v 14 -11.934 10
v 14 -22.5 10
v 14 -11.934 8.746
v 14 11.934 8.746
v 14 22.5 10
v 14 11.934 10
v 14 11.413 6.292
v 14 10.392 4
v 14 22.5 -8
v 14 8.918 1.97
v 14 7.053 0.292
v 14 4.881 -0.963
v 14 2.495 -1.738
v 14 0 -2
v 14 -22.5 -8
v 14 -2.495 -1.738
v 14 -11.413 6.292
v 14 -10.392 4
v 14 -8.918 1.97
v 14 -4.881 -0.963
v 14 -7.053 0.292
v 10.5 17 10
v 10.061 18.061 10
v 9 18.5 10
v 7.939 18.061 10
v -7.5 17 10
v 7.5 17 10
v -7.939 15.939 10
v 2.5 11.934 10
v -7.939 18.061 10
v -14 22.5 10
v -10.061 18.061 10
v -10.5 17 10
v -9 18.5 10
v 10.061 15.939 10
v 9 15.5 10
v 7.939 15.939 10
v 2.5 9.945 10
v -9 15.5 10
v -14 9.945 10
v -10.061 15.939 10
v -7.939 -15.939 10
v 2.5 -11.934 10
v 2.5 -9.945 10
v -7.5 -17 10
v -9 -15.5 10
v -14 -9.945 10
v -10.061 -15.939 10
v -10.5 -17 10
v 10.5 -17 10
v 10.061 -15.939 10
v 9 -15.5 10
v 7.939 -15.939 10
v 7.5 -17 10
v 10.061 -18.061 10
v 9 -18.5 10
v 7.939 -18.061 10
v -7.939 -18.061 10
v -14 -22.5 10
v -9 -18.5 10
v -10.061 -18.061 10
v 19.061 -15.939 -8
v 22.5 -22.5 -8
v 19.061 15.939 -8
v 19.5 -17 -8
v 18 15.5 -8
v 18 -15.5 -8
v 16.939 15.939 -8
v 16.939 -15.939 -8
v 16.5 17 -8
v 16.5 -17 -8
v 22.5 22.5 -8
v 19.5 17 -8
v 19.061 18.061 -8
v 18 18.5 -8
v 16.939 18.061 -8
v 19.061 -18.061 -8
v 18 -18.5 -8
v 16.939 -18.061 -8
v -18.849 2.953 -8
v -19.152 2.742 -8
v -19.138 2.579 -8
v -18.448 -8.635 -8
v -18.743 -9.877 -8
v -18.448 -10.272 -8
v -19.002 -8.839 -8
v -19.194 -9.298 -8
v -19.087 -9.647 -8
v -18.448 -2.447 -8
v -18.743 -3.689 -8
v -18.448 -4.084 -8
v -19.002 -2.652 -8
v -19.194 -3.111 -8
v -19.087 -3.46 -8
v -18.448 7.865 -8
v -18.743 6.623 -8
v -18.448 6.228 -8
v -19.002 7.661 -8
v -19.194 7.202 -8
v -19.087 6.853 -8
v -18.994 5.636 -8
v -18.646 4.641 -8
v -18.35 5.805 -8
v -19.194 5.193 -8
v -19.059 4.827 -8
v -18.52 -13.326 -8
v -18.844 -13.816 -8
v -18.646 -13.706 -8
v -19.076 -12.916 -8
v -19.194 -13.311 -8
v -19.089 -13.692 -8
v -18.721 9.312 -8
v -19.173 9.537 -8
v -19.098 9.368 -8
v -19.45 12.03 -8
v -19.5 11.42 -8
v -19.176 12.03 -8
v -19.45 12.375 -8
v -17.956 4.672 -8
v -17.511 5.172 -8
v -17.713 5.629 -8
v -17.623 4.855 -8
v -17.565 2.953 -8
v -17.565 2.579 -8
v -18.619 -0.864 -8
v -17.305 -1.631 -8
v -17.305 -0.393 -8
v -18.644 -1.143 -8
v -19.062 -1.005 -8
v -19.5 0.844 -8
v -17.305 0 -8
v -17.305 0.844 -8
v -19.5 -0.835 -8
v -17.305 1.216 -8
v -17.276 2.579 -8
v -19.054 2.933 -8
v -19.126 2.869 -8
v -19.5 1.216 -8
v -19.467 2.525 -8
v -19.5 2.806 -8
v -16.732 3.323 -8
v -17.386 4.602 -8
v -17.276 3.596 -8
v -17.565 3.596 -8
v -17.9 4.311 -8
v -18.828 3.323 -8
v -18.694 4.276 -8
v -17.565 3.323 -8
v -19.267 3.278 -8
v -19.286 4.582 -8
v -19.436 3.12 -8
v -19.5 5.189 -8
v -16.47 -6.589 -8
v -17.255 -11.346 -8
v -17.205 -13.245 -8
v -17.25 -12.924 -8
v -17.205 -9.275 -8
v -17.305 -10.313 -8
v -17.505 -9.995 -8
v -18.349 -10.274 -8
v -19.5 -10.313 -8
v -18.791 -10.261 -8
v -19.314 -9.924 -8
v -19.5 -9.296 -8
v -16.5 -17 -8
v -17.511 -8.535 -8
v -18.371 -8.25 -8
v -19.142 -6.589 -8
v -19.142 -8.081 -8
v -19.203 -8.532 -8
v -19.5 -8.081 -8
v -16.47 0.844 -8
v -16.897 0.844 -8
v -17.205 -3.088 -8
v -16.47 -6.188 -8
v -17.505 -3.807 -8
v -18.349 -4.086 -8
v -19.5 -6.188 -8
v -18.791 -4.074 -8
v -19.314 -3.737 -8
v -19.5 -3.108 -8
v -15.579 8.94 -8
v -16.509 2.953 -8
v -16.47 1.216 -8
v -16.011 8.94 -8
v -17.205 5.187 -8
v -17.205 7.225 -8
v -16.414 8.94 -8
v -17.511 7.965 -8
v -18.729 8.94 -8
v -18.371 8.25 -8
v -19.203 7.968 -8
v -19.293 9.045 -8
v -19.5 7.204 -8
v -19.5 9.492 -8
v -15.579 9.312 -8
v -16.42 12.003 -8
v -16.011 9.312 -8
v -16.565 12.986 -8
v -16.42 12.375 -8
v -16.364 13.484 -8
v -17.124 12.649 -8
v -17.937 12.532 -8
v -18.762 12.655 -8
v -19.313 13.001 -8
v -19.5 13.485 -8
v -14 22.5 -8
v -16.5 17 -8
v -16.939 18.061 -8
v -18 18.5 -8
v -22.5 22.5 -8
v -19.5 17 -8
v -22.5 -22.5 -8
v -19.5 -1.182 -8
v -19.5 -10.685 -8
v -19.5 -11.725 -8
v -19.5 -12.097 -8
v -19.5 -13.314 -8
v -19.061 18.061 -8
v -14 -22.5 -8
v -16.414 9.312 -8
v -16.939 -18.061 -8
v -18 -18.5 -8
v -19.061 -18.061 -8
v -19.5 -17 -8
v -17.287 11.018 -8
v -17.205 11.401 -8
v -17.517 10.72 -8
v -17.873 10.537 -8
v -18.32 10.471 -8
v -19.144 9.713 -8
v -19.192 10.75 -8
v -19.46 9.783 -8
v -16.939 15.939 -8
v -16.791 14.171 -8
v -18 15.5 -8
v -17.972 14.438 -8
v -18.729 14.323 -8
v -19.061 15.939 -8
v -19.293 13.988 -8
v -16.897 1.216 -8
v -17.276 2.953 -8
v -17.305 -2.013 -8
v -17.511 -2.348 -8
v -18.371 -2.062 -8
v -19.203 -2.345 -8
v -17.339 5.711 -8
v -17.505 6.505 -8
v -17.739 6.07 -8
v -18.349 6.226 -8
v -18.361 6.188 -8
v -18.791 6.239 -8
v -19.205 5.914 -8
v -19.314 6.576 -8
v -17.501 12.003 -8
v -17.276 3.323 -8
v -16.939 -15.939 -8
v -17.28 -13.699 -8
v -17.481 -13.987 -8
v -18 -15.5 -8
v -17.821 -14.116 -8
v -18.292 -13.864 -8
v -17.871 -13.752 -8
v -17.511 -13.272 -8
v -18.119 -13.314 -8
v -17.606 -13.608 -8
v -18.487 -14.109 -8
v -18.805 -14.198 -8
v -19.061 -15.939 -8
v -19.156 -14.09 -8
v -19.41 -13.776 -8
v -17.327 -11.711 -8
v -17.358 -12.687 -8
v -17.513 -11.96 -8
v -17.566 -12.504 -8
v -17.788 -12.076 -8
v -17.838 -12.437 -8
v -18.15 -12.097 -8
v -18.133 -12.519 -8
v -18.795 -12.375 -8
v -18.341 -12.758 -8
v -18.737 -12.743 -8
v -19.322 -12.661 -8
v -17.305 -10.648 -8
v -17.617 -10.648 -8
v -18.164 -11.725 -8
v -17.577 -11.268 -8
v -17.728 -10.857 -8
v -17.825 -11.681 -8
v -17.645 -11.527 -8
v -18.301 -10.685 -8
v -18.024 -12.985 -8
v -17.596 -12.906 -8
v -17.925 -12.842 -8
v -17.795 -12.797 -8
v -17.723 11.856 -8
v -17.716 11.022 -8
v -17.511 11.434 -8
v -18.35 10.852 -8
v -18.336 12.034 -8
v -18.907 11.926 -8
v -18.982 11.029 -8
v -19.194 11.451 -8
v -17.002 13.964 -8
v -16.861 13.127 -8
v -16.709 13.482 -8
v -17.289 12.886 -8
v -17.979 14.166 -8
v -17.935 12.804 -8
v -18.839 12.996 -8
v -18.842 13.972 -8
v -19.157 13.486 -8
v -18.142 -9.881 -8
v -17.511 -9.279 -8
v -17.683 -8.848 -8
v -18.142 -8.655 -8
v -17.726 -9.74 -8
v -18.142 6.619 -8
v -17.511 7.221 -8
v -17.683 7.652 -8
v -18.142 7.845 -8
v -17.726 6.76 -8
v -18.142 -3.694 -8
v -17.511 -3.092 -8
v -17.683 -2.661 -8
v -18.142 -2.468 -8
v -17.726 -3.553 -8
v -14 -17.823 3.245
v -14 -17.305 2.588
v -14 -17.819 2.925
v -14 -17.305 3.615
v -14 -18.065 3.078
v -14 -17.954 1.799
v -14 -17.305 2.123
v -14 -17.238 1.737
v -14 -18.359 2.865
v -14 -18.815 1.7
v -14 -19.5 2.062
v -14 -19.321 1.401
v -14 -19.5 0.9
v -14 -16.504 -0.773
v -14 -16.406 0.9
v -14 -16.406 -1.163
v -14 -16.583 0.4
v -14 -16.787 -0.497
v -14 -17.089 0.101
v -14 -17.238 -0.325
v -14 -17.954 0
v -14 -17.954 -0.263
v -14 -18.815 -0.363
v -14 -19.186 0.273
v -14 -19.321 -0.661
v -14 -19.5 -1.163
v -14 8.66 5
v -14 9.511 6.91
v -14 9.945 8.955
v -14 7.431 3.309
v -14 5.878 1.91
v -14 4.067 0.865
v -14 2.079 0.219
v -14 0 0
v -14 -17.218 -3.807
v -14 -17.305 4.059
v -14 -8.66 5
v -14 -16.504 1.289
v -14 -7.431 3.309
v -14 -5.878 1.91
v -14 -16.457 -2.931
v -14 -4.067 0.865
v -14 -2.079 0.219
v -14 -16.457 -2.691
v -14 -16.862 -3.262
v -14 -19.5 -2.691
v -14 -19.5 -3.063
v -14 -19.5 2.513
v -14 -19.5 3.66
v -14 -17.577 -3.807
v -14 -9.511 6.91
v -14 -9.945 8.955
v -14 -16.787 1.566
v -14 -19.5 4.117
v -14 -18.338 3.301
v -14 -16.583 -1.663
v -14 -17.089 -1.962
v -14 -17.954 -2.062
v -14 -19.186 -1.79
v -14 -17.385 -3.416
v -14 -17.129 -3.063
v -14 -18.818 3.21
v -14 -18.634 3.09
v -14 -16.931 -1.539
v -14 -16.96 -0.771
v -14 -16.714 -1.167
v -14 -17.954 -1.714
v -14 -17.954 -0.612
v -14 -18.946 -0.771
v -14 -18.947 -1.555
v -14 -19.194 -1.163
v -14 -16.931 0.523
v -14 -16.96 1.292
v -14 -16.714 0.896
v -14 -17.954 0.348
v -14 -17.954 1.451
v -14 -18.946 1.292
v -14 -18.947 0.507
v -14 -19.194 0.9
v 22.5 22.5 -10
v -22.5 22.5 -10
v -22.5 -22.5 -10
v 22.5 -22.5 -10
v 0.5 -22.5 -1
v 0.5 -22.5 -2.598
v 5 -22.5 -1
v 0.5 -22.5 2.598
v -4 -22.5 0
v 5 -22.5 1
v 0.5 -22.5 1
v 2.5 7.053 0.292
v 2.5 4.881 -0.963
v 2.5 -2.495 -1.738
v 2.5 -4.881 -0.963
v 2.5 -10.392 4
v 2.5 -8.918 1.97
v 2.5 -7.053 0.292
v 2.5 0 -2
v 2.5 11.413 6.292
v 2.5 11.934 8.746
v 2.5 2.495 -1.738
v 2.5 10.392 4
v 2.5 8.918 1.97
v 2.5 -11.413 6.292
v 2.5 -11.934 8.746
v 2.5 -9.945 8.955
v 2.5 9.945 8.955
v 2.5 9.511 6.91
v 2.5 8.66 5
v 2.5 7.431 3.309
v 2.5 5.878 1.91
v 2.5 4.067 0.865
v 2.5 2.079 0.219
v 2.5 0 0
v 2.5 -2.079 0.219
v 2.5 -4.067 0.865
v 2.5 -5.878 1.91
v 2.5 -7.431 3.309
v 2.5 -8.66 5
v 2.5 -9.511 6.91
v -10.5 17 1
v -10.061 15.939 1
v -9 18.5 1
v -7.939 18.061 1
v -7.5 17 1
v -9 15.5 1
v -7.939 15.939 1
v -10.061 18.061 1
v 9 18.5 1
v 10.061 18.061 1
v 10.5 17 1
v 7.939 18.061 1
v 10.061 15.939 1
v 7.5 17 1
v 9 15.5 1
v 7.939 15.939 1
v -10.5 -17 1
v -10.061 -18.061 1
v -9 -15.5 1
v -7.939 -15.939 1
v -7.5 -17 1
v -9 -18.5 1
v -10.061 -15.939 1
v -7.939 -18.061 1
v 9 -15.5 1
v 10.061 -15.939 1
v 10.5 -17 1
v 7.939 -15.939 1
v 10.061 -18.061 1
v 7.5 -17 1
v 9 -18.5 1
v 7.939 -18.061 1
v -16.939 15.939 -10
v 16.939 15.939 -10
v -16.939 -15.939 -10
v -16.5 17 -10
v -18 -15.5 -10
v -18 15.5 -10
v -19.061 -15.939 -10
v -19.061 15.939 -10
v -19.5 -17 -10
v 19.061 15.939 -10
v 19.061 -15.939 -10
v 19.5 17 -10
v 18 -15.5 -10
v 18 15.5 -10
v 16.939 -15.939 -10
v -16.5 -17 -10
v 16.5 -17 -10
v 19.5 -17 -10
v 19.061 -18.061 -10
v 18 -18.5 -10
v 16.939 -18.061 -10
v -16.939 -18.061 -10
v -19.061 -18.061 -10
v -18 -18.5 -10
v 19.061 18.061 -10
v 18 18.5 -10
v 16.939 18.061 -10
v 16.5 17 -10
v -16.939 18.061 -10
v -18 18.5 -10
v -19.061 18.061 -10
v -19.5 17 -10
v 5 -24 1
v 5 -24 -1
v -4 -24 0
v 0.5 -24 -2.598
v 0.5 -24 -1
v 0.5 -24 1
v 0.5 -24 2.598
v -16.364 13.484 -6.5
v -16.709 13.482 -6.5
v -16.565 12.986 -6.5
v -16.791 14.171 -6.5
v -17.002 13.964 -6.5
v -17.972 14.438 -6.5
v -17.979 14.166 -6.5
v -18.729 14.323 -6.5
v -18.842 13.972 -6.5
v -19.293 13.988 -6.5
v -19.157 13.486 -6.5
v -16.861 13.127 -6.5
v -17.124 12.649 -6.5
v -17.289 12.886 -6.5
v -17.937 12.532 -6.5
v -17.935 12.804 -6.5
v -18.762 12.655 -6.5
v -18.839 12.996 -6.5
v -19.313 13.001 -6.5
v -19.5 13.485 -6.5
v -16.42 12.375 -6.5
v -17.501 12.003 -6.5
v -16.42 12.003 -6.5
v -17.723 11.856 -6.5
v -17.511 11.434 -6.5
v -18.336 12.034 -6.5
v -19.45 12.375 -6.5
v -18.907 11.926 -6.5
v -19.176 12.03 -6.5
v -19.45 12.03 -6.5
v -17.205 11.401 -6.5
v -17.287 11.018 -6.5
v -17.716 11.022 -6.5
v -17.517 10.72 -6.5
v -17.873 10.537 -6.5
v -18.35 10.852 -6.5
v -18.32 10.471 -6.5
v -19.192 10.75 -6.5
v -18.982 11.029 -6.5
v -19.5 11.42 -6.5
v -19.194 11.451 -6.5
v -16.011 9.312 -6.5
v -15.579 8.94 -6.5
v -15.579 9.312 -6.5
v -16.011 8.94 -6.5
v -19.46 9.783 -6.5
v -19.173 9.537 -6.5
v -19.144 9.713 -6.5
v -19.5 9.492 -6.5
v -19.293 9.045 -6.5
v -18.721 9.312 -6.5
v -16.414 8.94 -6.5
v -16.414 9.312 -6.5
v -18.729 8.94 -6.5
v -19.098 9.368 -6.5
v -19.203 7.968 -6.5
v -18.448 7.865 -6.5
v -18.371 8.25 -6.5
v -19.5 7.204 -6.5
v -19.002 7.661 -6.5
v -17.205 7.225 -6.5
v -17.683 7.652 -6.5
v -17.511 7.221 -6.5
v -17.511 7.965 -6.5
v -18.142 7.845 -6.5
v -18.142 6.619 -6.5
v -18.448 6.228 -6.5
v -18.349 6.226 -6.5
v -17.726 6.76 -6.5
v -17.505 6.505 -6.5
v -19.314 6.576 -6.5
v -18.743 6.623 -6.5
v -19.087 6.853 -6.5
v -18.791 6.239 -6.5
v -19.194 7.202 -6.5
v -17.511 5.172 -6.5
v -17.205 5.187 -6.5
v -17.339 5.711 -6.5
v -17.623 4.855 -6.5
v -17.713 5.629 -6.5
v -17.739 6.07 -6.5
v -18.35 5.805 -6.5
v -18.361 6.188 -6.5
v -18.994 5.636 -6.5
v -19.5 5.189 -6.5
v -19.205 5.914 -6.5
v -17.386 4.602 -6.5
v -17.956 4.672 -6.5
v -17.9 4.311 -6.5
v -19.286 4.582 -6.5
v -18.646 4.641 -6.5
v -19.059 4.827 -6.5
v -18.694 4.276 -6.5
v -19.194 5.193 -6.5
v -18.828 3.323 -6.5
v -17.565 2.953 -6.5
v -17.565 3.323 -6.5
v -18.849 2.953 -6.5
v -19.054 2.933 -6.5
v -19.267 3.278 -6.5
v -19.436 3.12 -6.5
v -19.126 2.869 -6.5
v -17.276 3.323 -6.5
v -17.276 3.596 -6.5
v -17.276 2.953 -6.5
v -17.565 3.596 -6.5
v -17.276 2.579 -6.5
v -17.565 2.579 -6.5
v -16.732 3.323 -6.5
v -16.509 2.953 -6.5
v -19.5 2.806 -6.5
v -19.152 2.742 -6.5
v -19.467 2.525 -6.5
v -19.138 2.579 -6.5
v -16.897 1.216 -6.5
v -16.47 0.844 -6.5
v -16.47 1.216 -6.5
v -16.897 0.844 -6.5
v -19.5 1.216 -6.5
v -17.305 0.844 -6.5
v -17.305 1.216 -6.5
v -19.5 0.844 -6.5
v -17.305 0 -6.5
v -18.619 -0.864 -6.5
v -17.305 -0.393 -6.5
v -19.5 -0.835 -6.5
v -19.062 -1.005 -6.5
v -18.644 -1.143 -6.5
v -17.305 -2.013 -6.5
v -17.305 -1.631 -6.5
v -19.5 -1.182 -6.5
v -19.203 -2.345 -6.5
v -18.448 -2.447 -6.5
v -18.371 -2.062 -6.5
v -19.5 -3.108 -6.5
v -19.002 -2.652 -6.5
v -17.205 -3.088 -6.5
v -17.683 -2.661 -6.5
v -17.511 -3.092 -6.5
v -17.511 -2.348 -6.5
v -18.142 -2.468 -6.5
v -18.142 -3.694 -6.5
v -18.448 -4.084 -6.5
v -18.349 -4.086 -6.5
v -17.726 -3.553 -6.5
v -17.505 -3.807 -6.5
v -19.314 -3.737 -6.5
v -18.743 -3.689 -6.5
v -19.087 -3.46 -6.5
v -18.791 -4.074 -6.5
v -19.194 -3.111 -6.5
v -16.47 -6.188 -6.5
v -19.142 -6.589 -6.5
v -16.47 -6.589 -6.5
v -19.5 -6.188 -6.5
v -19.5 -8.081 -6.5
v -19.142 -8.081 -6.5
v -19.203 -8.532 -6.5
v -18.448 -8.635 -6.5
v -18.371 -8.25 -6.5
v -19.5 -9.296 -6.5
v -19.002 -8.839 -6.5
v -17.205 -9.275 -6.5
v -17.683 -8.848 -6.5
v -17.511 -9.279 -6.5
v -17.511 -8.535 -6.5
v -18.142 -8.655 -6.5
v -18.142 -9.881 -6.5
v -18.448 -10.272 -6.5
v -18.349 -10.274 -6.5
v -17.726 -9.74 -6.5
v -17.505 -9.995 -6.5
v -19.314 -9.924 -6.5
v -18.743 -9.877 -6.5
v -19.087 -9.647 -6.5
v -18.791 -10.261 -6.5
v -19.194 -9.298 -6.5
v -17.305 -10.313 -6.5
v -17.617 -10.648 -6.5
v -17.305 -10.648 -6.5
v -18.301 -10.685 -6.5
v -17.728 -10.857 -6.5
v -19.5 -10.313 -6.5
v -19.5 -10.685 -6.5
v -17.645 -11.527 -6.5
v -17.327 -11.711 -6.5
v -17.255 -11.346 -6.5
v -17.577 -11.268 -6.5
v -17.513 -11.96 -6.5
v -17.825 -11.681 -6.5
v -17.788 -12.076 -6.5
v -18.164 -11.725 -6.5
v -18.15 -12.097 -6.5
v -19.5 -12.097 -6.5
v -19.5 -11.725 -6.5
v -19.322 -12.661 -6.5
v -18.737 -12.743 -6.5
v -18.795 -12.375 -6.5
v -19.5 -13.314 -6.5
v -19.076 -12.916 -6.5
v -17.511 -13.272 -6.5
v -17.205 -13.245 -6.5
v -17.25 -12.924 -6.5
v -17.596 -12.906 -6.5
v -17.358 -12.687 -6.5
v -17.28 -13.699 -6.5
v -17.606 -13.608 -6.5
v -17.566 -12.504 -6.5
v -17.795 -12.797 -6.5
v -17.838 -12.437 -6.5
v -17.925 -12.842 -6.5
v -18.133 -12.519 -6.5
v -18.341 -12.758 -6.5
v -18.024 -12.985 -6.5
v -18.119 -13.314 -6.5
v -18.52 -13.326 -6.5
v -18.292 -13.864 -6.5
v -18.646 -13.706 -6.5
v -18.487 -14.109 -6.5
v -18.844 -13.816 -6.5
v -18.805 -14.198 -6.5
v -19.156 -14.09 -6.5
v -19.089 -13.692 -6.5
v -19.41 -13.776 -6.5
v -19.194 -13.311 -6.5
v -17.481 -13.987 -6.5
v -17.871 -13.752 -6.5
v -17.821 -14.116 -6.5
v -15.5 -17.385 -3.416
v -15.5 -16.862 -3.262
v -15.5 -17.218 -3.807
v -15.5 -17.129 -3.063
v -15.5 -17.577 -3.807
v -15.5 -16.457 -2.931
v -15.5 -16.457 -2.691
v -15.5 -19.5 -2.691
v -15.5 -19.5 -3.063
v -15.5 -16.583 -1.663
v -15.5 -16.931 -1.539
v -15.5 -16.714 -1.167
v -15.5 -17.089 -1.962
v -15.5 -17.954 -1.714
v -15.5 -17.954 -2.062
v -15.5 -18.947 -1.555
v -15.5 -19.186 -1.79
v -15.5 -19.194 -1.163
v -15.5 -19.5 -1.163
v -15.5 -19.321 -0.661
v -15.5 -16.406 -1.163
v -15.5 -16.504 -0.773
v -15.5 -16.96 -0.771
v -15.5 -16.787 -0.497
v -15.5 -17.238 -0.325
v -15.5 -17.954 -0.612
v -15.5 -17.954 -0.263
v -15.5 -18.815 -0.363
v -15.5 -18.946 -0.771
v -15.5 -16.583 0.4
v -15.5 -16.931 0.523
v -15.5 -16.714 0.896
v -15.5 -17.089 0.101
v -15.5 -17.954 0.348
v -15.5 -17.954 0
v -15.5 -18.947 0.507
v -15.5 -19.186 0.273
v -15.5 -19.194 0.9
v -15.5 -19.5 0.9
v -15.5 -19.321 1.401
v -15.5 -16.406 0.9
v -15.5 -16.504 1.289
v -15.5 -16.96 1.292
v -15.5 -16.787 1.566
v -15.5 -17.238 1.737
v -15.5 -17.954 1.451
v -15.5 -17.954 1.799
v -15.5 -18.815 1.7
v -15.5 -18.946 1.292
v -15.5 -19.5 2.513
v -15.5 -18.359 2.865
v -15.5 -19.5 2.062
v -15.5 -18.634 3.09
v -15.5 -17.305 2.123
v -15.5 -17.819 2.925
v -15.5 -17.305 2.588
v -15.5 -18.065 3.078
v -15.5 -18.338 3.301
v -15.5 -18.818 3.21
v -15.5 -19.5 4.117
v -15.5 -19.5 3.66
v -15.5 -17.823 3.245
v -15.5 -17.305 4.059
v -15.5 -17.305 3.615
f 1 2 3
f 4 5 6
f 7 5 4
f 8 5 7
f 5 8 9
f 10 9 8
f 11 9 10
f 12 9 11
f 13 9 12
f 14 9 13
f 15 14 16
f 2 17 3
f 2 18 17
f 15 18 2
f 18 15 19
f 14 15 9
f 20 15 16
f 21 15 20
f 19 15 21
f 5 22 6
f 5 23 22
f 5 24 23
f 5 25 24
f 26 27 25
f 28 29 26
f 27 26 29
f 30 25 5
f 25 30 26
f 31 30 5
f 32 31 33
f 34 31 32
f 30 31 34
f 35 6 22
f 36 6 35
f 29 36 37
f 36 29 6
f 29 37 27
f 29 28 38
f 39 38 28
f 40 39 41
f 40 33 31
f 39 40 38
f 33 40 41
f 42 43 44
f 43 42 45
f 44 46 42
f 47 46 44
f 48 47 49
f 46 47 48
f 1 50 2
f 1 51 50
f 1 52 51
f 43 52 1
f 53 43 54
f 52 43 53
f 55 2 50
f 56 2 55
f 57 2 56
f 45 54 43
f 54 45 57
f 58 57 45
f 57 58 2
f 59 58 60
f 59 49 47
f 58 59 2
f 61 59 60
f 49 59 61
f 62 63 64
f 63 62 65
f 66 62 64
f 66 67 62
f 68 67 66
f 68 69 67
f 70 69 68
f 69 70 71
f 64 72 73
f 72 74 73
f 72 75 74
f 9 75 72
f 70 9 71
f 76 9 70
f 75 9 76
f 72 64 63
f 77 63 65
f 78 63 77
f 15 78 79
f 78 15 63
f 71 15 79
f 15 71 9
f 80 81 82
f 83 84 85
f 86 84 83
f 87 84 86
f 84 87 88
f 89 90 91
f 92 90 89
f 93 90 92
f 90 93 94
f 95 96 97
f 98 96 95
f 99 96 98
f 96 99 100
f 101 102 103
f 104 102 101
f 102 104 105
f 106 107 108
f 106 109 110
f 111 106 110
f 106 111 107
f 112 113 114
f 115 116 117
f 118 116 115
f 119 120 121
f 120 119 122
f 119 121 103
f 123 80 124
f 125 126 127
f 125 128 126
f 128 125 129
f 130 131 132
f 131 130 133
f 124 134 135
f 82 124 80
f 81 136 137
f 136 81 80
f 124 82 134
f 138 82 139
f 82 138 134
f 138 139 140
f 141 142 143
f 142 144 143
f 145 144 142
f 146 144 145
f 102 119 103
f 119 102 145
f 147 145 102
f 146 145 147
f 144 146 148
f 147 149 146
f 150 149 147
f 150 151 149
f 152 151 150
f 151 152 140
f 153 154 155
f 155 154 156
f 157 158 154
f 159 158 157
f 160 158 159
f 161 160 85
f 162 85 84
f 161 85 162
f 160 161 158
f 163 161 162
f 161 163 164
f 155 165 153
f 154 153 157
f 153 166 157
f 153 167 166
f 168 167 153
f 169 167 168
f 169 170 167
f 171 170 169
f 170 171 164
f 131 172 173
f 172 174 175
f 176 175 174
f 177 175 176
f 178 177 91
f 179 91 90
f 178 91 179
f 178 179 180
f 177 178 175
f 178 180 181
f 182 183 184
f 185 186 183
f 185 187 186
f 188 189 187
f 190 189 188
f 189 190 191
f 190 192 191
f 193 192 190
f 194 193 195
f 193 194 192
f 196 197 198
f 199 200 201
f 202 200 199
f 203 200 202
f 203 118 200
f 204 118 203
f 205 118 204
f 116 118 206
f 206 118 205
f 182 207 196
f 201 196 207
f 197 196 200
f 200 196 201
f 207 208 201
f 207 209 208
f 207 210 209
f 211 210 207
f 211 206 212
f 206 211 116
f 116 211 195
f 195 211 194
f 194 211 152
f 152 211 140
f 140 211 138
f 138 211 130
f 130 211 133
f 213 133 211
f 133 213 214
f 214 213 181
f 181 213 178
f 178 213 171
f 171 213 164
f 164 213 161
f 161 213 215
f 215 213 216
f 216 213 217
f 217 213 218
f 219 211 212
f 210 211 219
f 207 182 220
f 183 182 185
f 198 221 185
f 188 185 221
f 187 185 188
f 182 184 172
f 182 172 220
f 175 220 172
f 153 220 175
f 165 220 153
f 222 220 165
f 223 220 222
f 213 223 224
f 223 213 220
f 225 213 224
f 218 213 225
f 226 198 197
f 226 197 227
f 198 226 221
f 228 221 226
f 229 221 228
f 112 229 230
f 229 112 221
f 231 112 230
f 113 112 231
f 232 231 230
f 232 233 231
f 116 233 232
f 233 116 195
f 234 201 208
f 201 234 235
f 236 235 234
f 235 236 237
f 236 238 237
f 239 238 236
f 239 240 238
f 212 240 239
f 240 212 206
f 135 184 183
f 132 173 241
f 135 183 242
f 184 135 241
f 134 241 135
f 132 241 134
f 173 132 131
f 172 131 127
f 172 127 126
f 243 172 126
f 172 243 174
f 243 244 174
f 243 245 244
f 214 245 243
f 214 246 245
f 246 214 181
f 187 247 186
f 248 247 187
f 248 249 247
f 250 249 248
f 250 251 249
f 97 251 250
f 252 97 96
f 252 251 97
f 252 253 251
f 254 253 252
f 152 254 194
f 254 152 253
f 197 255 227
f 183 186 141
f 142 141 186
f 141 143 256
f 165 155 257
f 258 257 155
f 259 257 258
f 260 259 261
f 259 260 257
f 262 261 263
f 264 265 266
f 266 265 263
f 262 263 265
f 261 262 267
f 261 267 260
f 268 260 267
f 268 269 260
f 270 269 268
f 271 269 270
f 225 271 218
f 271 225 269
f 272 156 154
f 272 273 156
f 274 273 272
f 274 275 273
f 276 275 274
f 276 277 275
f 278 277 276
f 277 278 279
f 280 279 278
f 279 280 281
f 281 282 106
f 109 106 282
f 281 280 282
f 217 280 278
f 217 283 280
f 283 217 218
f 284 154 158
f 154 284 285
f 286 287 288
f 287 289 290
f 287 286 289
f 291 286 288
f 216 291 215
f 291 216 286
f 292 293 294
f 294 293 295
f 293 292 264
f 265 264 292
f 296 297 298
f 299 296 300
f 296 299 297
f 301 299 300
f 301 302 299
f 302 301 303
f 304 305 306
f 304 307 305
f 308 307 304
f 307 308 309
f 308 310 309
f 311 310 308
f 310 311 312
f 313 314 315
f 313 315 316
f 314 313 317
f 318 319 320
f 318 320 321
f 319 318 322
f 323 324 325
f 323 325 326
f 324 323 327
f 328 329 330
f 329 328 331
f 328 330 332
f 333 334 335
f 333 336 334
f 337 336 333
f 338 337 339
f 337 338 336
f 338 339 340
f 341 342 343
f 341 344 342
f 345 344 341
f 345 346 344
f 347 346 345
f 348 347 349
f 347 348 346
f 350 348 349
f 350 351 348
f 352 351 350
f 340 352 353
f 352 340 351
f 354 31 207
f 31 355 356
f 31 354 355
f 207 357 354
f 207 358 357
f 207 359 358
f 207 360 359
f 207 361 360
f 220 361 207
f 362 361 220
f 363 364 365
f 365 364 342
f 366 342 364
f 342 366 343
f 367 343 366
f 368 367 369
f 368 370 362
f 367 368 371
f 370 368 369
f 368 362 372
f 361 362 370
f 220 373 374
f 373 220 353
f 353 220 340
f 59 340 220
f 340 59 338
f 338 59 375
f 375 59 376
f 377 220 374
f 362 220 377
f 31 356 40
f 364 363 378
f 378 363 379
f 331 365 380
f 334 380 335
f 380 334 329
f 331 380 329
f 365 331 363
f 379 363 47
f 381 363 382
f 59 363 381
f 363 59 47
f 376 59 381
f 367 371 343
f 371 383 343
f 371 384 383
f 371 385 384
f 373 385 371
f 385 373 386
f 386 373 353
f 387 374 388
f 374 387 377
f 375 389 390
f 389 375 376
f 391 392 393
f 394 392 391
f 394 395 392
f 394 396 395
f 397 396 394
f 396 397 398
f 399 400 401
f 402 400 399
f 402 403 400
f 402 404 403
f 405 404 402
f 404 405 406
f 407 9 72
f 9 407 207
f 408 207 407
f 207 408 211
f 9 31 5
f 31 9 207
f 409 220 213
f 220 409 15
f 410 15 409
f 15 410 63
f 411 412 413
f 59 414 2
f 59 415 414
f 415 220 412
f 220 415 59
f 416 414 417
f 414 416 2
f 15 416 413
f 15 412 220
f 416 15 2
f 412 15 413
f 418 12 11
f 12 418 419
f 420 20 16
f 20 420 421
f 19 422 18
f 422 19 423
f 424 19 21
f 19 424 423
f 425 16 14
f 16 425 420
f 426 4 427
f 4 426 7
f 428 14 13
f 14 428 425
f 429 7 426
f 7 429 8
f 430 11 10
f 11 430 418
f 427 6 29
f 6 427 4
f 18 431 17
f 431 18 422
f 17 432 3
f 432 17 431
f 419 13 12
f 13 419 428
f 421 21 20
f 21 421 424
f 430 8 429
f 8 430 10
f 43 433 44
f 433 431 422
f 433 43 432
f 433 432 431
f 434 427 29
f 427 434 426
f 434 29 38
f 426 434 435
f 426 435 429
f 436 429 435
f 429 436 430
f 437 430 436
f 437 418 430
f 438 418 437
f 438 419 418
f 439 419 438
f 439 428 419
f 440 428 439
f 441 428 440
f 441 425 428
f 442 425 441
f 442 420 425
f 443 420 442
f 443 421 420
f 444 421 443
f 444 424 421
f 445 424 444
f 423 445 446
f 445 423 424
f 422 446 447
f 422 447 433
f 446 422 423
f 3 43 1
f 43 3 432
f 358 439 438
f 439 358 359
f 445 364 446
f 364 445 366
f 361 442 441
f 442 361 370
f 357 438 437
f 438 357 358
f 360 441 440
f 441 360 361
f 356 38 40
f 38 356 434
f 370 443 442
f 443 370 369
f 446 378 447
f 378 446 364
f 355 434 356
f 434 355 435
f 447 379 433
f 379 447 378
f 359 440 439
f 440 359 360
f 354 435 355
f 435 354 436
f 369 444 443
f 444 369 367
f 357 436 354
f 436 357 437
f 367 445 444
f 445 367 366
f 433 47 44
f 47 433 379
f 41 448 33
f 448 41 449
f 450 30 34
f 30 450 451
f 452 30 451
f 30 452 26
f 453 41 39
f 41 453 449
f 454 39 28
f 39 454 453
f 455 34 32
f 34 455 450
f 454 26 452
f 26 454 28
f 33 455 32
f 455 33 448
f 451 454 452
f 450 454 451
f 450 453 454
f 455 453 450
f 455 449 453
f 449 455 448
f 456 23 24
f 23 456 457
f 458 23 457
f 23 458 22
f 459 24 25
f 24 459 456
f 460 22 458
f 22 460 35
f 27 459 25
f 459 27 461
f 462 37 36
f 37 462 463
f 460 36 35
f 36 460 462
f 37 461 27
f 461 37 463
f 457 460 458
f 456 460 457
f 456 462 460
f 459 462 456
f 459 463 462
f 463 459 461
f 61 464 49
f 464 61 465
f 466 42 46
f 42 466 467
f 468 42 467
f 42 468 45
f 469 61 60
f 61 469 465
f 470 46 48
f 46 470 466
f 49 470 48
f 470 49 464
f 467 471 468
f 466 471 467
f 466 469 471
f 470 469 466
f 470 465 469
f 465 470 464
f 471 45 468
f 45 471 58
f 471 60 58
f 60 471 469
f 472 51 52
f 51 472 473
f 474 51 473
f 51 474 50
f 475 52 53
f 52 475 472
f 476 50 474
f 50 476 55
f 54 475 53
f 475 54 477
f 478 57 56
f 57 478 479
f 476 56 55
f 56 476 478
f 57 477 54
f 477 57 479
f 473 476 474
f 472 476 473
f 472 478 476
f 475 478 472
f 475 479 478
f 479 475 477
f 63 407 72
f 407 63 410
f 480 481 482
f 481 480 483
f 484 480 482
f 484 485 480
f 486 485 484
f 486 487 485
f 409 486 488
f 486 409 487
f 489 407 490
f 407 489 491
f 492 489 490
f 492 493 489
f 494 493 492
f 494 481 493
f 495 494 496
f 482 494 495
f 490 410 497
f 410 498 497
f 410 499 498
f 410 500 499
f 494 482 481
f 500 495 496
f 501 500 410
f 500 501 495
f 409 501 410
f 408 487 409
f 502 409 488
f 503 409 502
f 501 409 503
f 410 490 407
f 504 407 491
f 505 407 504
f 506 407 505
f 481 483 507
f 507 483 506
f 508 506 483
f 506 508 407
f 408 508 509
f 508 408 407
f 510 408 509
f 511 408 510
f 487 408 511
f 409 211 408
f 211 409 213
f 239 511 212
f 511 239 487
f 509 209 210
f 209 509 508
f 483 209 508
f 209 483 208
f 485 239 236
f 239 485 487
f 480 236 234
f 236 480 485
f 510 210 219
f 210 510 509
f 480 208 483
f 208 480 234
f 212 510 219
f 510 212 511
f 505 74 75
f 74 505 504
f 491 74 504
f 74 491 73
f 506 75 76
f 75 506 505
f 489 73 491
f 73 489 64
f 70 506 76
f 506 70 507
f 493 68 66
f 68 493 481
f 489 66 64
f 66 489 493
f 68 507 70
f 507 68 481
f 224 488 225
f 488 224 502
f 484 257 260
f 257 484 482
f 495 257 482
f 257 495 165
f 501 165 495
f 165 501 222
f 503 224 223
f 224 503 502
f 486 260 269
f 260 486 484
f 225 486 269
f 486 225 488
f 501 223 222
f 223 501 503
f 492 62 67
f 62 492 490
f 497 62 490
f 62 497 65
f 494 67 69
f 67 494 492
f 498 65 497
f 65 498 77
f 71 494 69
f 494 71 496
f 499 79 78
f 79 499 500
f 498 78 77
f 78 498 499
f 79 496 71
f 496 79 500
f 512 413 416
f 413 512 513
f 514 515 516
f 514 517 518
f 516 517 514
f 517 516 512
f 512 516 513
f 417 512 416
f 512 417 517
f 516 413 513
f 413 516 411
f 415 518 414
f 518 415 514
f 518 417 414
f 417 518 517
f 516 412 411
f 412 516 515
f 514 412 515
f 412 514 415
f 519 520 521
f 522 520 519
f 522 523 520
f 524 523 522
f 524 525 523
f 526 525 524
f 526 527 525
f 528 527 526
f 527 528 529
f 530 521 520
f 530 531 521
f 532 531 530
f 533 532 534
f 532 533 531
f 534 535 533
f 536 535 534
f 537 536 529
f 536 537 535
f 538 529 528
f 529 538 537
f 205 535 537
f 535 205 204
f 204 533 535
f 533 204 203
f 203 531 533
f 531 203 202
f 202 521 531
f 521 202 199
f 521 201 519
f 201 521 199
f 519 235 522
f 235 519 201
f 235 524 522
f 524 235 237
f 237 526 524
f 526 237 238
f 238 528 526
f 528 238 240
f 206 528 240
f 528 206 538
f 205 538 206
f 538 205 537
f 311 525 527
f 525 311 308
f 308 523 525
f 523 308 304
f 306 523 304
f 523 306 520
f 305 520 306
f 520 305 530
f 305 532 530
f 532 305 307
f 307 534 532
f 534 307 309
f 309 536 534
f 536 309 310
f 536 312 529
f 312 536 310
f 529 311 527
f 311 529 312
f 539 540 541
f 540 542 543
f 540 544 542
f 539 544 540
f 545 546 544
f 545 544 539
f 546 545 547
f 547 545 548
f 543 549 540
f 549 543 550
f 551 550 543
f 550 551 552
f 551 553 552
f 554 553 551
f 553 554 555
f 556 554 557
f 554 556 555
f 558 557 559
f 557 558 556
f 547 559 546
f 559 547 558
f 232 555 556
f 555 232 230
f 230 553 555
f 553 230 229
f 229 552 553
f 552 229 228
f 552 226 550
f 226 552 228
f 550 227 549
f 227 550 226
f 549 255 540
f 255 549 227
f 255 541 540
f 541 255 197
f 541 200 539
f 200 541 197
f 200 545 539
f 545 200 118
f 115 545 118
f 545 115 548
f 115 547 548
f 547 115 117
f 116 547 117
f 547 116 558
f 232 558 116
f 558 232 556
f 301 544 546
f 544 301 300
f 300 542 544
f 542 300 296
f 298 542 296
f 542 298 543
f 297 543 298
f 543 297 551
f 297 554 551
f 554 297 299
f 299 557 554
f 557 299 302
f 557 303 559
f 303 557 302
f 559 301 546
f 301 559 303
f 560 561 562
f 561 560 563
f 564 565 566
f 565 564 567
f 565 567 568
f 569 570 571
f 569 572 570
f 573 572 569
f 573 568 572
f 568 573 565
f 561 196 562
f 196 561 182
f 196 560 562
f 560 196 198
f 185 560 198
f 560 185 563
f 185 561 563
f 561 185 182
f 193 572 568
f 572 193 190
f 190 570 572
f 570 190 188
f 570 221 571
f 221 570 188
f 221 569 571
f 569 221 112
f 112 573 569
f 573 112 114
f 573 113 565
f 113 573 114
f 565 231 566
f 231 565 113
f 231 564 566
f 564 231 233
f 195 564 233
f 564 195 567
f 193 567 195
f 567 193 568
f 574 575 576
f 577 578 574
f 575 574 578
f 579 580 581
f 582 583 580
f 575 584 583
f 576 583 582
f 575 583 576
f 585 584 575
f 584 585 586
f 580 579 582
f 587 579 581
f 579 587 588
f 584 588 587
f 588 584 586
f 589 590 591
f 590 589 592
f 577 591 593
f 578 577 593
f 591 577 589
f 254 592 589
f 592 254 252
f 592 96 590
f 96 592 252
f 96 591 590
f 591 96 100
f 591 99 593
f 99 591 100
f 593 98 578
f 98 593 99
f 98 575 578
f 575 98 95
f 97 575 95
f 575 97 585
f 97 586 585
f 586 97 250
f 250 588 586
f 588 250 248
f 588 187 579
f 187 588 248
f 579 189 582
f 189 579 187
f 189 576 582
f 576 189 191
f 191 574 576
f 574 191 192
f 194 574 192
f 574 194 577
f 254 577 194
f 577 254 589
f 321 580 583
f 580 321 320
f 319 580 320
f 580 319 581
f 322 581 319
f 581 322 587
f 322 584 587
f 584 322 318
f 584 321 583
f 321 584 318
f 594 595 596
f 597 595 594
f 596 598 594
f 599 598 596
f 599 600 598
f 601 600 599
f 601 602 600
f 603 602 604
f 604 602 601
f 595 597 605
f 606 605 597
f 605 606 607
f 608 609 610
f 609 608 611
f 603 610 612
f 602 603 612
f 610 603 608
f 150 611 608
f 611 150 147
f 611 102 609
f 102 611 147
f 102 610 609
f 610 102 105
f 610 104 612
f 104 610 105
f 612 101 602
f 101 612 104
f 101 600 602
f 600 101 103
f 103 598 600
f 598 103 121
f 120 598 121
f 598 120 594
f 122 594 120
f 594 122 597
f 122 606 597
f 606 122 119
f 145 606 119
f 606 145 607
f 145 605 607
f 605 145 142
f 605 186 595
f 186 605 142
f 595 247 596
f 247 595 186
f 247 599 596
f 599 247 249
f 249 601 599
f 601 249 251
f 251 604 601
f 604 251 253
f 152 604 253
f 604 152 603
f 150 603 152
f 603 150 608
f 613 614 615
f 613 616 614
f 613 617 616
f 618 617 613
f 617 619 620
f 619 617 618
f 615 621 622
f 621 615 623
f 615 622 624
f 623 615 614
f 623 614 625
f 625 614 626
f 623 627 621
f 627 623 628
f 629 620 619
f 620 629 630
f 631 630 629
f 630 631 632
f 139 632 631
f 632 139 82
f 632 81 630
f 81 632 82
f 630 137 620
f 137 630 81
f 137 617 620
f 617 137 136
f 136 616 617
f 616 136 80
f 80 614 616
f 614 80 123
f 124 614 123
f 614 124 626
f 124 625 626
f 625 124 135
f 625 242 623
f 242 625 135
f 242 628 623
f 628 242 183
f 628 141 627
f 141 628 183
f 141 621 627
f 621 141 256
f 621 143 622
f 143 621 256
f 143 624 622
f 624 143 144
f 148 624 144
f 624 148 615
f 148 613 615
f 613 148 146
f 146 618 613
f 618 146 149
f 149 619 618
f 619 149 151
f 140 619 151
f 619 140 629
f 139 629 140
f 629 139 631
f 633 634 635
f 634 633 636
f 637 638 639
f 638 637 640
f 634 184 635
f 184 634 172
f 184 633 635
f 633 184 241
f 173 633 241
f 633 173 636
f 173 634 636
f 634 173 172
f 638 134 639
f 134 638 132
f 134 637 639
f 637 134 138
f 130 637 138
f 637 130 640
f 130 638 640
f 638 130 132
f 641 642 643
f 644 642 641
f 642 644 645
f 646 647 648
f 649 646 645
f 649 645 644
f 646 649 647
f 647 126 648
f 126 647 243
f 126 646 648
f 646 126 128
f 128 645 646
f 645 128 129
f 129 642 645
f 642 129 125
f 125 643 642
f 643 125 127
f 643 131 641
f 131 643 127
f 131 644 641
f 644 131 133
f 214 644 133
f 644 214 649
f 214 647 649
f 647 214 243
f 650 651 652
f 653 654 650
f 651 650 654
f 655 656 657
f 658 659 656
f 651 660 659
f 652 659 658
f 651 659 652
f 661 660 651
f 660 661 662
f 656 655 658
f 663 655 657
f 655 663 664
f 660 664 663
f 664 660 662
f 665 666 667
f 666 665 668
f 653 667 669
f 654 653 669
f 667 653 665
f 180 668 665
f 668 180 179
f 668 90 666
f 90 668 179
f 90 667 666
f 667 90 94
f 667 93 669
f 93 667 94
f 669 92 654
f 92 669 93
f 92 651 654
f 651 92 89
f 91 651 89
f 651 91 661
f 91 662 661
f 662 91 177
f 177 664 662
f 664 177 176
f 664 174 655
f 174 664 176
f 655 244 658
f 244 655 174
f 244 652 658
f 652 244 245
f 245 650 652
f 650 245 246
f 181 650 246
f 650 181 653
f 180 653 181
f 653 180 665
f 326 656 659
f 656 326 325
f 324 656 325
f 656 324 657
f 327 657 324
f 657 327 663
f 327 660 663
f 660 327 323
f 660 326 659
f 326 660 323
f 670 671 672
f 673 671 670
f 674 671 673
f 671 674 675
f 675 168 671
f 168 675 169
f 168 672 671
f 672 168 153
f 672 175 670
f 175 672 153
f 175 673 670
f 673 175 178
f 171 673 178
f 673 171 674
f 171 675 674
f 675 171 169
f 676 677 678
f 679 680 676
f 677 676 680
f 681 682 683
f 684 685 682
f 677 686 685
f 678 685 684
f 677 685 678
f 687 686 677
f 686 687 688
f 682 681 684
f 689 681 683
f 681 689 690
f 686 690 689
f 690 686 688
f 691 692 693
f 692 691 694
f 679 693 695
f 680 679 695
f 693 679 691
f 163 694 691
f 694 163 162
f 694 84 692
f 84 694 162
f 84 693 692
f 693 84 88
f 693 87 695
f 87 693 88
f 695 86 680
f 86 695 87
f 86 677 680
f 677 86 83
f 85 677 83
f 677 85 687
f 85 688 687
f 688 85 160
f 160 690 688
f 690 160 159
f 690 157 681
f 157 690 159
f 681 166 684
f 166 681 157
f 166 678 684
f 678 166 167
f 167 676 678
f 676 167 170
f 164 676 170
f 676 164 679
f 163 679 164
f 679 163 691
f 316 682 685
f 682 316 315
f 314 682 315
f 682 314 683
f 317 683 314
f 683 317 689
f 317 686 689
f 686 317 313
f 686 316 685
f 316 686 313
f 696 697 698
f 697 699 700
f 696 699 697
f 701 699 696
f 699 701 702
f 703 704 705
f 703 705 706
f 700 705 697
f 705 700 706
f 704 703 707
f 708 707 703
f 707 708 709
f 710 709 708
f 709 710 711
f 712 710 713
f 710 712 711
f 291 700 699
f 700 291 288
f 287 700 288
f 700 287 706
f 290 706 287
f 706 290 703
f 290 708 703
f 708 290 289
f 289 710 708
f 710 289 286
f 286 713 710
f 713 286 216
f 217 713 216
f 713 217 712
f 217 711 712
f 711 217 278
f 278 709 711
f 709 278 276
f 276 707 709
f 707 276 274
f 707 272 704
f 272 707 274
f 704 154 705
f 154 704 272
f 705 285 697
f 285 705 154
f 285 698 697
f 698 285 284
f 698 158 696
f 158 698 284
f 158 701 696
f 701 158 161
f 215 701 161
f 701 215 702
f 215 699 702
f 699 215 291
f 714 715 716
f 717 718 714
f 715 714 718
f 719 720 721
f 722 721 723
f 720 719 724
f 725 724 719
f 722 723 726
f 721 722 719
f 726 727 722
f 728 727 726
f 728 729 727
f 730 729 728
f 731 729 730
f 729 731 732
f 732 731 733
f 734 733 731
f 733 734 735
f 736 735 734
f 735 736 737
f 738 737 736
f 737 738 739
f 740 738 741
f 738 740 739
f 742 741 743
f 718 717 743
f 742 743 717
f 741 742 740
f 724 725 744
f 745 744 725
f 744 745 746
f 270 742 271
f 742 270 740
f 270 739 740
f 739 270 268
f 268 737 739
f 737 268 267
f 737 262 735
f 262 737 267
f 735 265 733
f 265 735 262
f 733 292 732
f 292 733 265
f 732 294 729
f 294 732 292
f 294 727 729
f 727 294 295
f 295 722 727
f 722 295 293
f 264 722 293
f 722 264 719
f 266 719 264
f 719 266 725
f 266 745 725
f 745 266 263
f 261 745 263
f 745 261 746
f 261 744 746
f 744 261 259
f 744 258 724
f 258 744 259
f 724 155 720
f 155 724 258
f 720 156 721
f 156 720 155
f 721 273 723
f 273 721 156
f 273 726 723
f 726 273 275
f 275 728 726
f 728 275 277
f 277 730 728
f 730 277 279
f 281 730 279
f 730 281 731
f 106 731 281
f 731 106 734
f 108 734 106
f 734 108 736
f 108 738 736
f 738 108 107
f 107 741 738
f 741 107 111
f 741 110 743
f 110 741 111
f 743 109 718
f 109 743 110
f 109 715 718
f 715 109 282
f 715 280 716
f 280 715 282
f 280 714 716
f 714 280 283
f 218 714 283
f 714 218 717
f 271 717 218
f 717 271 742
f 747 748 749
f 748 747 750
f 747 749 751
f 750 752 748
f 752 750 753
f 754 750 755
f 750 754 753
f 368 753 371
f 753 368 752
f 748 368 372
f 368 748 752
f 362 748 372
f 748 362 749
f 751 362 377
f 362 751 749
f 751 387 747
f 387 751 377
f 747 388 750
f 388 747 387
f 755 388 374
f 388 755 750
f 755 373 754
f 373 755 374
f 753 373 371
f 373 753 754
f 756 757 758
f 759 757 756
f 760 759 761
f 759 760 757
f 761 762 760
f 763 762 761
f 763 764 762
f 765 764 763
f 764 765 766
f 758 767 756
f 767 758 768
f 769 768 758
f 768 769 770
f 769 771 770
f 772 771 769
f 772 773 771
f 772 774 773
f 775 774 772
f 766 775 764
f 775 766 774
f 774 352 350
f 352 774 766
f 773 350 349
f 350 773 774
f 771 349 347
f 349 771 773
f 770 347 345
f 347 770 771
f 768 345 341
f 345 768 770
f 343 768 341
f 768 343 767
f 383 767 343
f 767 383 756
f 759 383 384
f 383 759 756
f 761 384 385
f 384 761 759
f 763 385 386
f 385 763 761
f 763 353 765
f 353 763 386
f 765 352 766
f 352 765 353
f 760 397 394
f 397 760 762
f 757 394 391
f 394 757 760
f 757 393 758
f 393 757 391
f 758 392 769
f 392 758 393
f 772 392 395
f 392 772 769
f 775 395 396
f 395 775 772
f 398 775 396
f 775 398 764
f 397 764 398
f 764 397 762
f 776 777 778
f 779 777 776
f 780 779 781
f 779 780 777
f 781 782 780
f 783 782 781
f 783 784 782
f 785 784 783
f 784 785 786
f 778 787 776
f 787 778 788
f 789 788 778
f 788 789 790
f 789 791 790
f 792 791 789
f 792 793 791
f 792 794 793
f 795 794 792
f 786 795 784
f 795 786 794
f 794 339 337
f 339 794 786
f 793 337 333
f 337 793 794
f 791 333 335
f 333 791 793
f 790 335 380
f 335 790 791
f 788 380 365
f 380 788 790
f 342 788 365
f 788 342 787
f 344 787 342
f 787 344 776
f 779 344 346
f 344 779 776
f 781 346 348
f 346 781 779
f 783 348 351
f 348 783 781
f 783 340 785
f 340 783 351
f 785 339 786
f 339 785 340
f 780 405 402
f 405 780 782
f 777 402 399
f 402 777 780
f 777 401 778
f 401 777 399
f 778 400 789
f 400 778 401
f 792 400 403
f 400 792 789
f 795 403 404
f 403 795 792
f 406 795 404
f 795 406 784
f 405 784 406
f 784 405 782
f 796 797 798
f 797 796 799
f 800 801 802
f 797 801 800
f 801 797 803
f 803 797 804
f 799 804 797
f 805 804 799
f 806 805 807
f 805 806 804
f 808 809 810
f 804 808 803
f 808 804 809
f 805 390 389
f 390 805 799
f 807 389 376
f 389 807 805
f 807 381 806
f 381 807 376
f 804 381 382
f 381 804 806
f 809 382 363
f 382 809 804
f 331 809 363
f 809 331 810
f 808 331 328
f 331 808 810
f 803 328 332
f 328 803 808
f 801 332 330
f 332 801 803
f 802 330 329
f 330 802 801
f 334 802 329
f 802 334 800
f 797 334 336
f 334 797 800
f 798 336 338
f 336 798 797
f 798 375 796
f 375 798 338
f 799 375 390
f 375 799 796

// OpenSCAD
// file: arrow.scad
module arrow(){
	//arrowBody
	translate([0,-1,0]) color([0,1,1]) cube(size=[2.5,2,5]);
	//arrowHead
	translate([0,0,-1]) color([0,1,1]) rotate([0,90,0]) cylinder(h=2.5,r=3,$fn=3);
}

arrow();
// main file
use <write.scad>
use <arrow.scad>

module objectiveLensMountBottom(){
	difference(){
		//mainBody
		translate([0,0,1]) color([0,.6,.5]) cube(size=[28,45,18],center=true);
		//lensHole
		translate([9,0,10]) rotate([0,90,0]) cylinder(h=13,r=12,center=true);
		translate([-6,0,10]) rotate([0,90,0]) cylinder(h=18,r=10,center=true);
		//screwHoles
		translate([-9,17,6]) color([1,0,0]) cylinder(h=10,r=1.5,$fn=8,center=true);
		translate([9,17,6]) color([1,0,0]) cylinder(h=10,r=1.5,$fn=8,center=true);
		translate([-9,-17,6]) color([1,0,0]) cylinder(h=10,r=1.5,$fn=8,center=true);
		translate([9,-17,6]) color([1,0,0]) cylinder(h=10,r=1.5,$fn=8,center=true);
	}
	difference(){
		//base
		translate([0,0,-9]) color([0,.6,.5]) cube(size=[45,45,2],center=true);
		//screwHoles
		translate([-18,17,-9]) color([1,0,0]) cylinder(h=4,r=1.5,$fn=8,center=true);
		translate([18,17,-9]) color([1,0,0]) cylinder(h=4,r=1.5,$fn=8,center=true);
		translate([-18,-17,-9]) color([1,0,0]) cylinder(h=4,r=1.5,$fn=8,center=true);
		translate([18,-17,-9]) color([1,0,0]) cylinder(h=4,r=1.5,$fn=8,center=true);
	}
	//arrow
	translate([0,-24,0]){
		rotate([90,0,90]){
			arrow();
		}
	}
	rotate([0,0,-90]){
		translate([0,-18,-8]){
			write("Objective Lens",h=3,t=3,center=true);
		}
	}
	rotate([0,-90,0]){
		translate([0,-18,14]){
			write("100x",h=3,t=3,center=true);
		}
	}
}

translate([0,0,0]){
	objectiveLensMountBottom();
}
